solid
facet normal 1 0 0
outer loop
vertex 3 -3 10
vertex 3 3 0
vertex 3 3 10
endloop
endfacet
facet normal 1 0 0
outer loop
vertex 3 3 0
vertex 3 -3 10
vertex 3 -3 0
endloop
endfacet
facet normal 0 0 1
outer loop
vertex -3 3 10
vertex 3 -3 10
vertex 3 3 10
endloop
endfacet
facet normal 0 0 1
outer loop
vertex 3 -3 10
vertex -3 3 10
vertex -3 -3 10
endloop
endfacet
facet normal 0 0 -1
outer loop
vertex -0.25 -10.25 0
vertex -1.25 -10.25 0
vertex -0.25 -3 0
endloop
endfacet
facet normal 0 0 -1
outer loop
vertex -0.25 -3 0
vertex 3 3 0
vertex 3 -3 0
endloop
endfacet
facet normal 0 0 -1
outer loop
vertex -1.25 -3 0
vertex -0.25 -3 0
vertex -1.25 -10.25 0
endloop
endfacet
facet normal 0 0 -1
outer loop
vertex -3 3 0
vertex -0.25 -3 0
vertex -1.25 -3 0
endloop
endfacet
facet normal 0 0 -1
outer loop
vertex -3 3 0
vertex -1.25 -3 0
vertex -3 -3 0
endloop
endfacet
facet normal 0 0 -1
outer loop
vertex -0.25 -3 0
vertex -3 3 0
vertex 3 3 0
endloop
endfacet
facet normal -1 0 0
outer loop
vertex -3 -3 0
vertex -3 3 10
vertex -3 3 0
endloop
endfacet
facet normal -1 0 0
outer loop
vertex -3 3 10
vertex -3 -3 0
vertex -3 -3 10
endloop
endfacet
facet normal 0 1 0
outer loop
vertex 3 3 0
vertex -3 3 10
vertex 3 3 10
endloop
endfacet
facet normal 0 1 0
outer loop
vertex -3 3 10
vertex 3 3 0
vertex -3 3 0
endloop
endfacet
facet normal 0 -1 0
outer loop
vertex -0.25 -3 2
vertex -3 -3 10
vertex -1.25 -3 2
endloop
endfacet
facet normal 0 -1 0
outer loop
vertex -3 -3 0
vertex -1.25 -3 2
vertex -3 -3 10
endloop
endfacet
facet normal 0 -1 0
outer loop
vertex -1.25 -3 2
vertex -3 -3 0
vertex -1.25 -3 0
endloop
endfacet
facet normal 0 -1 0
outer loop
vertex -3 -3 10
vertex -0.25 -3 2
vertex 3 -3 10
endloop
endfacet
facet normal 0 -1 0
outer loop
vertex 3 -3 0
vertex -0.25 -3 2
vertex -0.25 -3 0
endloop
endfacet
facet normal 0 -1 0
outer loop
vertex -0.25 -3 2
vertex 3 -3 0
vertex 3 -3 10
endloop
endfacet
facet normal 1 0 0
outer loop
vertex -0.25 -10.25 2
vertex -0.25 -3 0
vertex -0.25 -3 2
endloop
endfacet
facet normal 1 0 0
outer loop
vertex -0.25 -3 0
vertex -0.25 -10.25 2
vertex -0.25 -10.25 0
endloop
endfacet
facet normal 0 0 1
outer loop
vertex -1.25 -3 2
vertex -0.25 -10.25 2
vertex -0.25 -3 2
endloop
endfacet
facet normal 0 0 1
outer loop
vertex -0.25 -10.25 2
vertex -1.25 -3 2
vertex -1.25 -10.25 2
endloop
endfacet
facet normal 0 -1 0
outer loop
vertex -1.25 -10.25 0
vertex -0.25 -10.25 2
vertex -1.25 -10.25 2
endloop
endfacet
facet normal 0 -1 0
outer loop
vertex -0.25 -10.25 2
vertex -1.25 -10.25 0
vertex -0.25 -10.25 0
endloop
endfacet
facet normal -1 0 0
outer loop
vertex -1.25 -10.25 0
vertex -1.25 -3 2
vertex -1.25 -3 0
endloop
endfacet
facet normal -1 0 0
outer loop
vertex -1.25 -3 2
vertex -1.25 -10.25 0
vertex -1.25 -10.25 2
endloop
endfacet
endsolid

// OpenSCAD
translate([0, 0, 5]) color([0,1,0,0.9]) cube([6, 6, 10], center=true);
translate([-0.5, -0.5, 1]) color([1,0,0]) cube([0.5, 0.5, 2], center=true);
translate([-0.5, -1.0, 1]) color([1,0,0]) cube([0.5, 0.5, 2], center=true);
translate([-0.5, -1.5, 1]) color([1,0,0]) cube([0.5, 0.5, 2], center=true);
translate([-0.5, -2.0, 1]) color([1,0,0]) cube([0.5, 0.5, 2], center=true);
translate([-0.5, -2.5, 1]) color([1,0,0]) cube([0.5, 0.5, 2], center=true);
translate([-0.5, -3.0, 1]) color([1,0,0]) cube([0.5, 0.5, 2], center=true);
translate([-0.5, -3.5, 1]) color([1,0,0]) cube([0.5, 0.5, 2], center=true);
translate([-0.5, -4.0, 1]) color([1,0,0]) cube([0.5, 0.5, 2], center=true);
translate([-0.5, -4.5, 1]) color([1,0,0]) cube([0.5, 0.5, 2], center=true);
translate([-0.5, -5.0, 1]) color([1,0,0]) cube([0.5, 0.5, 2], center=true);
translate([-0.5, -5.5, 1]) color([1,0,0]) cube([0.5, 0.5, 2], center=true);
translate([-0.5, -6.0, 1]) color([1,0,0]) cube([0.5, 0.5, 2], center=true);
translate([-0.5, -6.5, 1]) color([1,0,0]) cube([0.5, 0.5, 2], center=true);
translate([-0.5, -7.0, 1]) color([1,0,0]) cube([0.5, 0.5, 2], center=true);
translate([-0.5, -7.5, 1]) color([1,0,0]) cube([0.5, 0.5, 2], center=true);
translate([-0.5, -8.0, 1]) color([1,0,0]) cube([0.5, 0.5, 2], center=true);
translate([-0.5, -8.5, 1]) color([1,0,0]) cube([0.5, 0.5, 2], center=true);
translate([-0.5, -9.0, 1]) color([1,0,0]) cube([0.5, 0.5, 2], center=true);
translate([-0.5, -9.5, 1]) color([1,0,0]) cube([0.5, 0.5, 2], center=true);
translate([-0.5, -10.0, 1]) color([1,0,0]) cube([0.5, 0.5, 2], center=true);
translate([-1.0, -0.5, 1]) color([1,0,0]) cube([0.5, 0.5, 2], center=true);
translate([-1.0, -1.0, 1]) color([1,0,0]) cube([0.5, 0.5, 2], center=true);
translate([-1.0, -1.5, 1]) color([1,0,0]) cube([0.5, 0.5, 2], center=true);
translate([-1.0, -2.0, 1]) color([1,0,0]) cube([0.5, 0.5, 2], center=true);
translate([-1.0, -2.5, 1]) color([1,0,0]) cube([0.5, 0.5, 2], center=true);
translate([-1.0, -3.0, 1]) color([1,0,0]) cube([0.5, 0.5, 2], center=true);
translate([-1.0, -3.5, 1]) color([1,0,0]) cube([0.5, 0.5, 2], center=true);
translate([-1.0, -4.0, 1]) color([1,0,0]) cube([0.5, 0.5, 2], center=true);
translate([-1.0, -4.5, 1]) color([1,0,0]) cube([0.5, 0.5, 2], center=true);
translate([-1.0, -5.0, 1]) color([1,0,0]) cube([0.5, 0.5, 2], center=true);
translate([-1.0, -5.5, 1]) color([1,0,0]) cube([0.5, 0.5, 2], center=true);
translate([-1.0, -6.0, 1]) color([1,0,0]) cube([0.5, 0.5, 2], center=true);
translate([-1.0, -6.5, 1]) color([1,0,0]) cube([0.5, 0.5, 2], center=true);
translate([-1.0, -7.0, 1]) color([1,0,0]) cube([0.5, 0.5, 2], center=true);
translate([-1.0, -7.5, 1]) color([1,0,0]) cube([0.5, 0.5, 2], center=true);
translate([-1.0, -8.0, 1]) color([1,0,0]) cube([0.5, 0.5, 2], center=true);
translate([-1.0, -8.5, 1]) color([1,0,0]) cube([0.5, 0.5, 2], center=true);
translate([-1.0, -9.0, 1]) color([1,0,0]) cube([0.5, 0.5, 2], center=true);
translate([-1.0, -9.5, 1]) color([1,0,0]) cube([0.5, 0.5, 2], center=true);
translate([-1.0, -10.0, 1]) color([1,0,0]) cube([0.5, 0.5, 2], center=true);
